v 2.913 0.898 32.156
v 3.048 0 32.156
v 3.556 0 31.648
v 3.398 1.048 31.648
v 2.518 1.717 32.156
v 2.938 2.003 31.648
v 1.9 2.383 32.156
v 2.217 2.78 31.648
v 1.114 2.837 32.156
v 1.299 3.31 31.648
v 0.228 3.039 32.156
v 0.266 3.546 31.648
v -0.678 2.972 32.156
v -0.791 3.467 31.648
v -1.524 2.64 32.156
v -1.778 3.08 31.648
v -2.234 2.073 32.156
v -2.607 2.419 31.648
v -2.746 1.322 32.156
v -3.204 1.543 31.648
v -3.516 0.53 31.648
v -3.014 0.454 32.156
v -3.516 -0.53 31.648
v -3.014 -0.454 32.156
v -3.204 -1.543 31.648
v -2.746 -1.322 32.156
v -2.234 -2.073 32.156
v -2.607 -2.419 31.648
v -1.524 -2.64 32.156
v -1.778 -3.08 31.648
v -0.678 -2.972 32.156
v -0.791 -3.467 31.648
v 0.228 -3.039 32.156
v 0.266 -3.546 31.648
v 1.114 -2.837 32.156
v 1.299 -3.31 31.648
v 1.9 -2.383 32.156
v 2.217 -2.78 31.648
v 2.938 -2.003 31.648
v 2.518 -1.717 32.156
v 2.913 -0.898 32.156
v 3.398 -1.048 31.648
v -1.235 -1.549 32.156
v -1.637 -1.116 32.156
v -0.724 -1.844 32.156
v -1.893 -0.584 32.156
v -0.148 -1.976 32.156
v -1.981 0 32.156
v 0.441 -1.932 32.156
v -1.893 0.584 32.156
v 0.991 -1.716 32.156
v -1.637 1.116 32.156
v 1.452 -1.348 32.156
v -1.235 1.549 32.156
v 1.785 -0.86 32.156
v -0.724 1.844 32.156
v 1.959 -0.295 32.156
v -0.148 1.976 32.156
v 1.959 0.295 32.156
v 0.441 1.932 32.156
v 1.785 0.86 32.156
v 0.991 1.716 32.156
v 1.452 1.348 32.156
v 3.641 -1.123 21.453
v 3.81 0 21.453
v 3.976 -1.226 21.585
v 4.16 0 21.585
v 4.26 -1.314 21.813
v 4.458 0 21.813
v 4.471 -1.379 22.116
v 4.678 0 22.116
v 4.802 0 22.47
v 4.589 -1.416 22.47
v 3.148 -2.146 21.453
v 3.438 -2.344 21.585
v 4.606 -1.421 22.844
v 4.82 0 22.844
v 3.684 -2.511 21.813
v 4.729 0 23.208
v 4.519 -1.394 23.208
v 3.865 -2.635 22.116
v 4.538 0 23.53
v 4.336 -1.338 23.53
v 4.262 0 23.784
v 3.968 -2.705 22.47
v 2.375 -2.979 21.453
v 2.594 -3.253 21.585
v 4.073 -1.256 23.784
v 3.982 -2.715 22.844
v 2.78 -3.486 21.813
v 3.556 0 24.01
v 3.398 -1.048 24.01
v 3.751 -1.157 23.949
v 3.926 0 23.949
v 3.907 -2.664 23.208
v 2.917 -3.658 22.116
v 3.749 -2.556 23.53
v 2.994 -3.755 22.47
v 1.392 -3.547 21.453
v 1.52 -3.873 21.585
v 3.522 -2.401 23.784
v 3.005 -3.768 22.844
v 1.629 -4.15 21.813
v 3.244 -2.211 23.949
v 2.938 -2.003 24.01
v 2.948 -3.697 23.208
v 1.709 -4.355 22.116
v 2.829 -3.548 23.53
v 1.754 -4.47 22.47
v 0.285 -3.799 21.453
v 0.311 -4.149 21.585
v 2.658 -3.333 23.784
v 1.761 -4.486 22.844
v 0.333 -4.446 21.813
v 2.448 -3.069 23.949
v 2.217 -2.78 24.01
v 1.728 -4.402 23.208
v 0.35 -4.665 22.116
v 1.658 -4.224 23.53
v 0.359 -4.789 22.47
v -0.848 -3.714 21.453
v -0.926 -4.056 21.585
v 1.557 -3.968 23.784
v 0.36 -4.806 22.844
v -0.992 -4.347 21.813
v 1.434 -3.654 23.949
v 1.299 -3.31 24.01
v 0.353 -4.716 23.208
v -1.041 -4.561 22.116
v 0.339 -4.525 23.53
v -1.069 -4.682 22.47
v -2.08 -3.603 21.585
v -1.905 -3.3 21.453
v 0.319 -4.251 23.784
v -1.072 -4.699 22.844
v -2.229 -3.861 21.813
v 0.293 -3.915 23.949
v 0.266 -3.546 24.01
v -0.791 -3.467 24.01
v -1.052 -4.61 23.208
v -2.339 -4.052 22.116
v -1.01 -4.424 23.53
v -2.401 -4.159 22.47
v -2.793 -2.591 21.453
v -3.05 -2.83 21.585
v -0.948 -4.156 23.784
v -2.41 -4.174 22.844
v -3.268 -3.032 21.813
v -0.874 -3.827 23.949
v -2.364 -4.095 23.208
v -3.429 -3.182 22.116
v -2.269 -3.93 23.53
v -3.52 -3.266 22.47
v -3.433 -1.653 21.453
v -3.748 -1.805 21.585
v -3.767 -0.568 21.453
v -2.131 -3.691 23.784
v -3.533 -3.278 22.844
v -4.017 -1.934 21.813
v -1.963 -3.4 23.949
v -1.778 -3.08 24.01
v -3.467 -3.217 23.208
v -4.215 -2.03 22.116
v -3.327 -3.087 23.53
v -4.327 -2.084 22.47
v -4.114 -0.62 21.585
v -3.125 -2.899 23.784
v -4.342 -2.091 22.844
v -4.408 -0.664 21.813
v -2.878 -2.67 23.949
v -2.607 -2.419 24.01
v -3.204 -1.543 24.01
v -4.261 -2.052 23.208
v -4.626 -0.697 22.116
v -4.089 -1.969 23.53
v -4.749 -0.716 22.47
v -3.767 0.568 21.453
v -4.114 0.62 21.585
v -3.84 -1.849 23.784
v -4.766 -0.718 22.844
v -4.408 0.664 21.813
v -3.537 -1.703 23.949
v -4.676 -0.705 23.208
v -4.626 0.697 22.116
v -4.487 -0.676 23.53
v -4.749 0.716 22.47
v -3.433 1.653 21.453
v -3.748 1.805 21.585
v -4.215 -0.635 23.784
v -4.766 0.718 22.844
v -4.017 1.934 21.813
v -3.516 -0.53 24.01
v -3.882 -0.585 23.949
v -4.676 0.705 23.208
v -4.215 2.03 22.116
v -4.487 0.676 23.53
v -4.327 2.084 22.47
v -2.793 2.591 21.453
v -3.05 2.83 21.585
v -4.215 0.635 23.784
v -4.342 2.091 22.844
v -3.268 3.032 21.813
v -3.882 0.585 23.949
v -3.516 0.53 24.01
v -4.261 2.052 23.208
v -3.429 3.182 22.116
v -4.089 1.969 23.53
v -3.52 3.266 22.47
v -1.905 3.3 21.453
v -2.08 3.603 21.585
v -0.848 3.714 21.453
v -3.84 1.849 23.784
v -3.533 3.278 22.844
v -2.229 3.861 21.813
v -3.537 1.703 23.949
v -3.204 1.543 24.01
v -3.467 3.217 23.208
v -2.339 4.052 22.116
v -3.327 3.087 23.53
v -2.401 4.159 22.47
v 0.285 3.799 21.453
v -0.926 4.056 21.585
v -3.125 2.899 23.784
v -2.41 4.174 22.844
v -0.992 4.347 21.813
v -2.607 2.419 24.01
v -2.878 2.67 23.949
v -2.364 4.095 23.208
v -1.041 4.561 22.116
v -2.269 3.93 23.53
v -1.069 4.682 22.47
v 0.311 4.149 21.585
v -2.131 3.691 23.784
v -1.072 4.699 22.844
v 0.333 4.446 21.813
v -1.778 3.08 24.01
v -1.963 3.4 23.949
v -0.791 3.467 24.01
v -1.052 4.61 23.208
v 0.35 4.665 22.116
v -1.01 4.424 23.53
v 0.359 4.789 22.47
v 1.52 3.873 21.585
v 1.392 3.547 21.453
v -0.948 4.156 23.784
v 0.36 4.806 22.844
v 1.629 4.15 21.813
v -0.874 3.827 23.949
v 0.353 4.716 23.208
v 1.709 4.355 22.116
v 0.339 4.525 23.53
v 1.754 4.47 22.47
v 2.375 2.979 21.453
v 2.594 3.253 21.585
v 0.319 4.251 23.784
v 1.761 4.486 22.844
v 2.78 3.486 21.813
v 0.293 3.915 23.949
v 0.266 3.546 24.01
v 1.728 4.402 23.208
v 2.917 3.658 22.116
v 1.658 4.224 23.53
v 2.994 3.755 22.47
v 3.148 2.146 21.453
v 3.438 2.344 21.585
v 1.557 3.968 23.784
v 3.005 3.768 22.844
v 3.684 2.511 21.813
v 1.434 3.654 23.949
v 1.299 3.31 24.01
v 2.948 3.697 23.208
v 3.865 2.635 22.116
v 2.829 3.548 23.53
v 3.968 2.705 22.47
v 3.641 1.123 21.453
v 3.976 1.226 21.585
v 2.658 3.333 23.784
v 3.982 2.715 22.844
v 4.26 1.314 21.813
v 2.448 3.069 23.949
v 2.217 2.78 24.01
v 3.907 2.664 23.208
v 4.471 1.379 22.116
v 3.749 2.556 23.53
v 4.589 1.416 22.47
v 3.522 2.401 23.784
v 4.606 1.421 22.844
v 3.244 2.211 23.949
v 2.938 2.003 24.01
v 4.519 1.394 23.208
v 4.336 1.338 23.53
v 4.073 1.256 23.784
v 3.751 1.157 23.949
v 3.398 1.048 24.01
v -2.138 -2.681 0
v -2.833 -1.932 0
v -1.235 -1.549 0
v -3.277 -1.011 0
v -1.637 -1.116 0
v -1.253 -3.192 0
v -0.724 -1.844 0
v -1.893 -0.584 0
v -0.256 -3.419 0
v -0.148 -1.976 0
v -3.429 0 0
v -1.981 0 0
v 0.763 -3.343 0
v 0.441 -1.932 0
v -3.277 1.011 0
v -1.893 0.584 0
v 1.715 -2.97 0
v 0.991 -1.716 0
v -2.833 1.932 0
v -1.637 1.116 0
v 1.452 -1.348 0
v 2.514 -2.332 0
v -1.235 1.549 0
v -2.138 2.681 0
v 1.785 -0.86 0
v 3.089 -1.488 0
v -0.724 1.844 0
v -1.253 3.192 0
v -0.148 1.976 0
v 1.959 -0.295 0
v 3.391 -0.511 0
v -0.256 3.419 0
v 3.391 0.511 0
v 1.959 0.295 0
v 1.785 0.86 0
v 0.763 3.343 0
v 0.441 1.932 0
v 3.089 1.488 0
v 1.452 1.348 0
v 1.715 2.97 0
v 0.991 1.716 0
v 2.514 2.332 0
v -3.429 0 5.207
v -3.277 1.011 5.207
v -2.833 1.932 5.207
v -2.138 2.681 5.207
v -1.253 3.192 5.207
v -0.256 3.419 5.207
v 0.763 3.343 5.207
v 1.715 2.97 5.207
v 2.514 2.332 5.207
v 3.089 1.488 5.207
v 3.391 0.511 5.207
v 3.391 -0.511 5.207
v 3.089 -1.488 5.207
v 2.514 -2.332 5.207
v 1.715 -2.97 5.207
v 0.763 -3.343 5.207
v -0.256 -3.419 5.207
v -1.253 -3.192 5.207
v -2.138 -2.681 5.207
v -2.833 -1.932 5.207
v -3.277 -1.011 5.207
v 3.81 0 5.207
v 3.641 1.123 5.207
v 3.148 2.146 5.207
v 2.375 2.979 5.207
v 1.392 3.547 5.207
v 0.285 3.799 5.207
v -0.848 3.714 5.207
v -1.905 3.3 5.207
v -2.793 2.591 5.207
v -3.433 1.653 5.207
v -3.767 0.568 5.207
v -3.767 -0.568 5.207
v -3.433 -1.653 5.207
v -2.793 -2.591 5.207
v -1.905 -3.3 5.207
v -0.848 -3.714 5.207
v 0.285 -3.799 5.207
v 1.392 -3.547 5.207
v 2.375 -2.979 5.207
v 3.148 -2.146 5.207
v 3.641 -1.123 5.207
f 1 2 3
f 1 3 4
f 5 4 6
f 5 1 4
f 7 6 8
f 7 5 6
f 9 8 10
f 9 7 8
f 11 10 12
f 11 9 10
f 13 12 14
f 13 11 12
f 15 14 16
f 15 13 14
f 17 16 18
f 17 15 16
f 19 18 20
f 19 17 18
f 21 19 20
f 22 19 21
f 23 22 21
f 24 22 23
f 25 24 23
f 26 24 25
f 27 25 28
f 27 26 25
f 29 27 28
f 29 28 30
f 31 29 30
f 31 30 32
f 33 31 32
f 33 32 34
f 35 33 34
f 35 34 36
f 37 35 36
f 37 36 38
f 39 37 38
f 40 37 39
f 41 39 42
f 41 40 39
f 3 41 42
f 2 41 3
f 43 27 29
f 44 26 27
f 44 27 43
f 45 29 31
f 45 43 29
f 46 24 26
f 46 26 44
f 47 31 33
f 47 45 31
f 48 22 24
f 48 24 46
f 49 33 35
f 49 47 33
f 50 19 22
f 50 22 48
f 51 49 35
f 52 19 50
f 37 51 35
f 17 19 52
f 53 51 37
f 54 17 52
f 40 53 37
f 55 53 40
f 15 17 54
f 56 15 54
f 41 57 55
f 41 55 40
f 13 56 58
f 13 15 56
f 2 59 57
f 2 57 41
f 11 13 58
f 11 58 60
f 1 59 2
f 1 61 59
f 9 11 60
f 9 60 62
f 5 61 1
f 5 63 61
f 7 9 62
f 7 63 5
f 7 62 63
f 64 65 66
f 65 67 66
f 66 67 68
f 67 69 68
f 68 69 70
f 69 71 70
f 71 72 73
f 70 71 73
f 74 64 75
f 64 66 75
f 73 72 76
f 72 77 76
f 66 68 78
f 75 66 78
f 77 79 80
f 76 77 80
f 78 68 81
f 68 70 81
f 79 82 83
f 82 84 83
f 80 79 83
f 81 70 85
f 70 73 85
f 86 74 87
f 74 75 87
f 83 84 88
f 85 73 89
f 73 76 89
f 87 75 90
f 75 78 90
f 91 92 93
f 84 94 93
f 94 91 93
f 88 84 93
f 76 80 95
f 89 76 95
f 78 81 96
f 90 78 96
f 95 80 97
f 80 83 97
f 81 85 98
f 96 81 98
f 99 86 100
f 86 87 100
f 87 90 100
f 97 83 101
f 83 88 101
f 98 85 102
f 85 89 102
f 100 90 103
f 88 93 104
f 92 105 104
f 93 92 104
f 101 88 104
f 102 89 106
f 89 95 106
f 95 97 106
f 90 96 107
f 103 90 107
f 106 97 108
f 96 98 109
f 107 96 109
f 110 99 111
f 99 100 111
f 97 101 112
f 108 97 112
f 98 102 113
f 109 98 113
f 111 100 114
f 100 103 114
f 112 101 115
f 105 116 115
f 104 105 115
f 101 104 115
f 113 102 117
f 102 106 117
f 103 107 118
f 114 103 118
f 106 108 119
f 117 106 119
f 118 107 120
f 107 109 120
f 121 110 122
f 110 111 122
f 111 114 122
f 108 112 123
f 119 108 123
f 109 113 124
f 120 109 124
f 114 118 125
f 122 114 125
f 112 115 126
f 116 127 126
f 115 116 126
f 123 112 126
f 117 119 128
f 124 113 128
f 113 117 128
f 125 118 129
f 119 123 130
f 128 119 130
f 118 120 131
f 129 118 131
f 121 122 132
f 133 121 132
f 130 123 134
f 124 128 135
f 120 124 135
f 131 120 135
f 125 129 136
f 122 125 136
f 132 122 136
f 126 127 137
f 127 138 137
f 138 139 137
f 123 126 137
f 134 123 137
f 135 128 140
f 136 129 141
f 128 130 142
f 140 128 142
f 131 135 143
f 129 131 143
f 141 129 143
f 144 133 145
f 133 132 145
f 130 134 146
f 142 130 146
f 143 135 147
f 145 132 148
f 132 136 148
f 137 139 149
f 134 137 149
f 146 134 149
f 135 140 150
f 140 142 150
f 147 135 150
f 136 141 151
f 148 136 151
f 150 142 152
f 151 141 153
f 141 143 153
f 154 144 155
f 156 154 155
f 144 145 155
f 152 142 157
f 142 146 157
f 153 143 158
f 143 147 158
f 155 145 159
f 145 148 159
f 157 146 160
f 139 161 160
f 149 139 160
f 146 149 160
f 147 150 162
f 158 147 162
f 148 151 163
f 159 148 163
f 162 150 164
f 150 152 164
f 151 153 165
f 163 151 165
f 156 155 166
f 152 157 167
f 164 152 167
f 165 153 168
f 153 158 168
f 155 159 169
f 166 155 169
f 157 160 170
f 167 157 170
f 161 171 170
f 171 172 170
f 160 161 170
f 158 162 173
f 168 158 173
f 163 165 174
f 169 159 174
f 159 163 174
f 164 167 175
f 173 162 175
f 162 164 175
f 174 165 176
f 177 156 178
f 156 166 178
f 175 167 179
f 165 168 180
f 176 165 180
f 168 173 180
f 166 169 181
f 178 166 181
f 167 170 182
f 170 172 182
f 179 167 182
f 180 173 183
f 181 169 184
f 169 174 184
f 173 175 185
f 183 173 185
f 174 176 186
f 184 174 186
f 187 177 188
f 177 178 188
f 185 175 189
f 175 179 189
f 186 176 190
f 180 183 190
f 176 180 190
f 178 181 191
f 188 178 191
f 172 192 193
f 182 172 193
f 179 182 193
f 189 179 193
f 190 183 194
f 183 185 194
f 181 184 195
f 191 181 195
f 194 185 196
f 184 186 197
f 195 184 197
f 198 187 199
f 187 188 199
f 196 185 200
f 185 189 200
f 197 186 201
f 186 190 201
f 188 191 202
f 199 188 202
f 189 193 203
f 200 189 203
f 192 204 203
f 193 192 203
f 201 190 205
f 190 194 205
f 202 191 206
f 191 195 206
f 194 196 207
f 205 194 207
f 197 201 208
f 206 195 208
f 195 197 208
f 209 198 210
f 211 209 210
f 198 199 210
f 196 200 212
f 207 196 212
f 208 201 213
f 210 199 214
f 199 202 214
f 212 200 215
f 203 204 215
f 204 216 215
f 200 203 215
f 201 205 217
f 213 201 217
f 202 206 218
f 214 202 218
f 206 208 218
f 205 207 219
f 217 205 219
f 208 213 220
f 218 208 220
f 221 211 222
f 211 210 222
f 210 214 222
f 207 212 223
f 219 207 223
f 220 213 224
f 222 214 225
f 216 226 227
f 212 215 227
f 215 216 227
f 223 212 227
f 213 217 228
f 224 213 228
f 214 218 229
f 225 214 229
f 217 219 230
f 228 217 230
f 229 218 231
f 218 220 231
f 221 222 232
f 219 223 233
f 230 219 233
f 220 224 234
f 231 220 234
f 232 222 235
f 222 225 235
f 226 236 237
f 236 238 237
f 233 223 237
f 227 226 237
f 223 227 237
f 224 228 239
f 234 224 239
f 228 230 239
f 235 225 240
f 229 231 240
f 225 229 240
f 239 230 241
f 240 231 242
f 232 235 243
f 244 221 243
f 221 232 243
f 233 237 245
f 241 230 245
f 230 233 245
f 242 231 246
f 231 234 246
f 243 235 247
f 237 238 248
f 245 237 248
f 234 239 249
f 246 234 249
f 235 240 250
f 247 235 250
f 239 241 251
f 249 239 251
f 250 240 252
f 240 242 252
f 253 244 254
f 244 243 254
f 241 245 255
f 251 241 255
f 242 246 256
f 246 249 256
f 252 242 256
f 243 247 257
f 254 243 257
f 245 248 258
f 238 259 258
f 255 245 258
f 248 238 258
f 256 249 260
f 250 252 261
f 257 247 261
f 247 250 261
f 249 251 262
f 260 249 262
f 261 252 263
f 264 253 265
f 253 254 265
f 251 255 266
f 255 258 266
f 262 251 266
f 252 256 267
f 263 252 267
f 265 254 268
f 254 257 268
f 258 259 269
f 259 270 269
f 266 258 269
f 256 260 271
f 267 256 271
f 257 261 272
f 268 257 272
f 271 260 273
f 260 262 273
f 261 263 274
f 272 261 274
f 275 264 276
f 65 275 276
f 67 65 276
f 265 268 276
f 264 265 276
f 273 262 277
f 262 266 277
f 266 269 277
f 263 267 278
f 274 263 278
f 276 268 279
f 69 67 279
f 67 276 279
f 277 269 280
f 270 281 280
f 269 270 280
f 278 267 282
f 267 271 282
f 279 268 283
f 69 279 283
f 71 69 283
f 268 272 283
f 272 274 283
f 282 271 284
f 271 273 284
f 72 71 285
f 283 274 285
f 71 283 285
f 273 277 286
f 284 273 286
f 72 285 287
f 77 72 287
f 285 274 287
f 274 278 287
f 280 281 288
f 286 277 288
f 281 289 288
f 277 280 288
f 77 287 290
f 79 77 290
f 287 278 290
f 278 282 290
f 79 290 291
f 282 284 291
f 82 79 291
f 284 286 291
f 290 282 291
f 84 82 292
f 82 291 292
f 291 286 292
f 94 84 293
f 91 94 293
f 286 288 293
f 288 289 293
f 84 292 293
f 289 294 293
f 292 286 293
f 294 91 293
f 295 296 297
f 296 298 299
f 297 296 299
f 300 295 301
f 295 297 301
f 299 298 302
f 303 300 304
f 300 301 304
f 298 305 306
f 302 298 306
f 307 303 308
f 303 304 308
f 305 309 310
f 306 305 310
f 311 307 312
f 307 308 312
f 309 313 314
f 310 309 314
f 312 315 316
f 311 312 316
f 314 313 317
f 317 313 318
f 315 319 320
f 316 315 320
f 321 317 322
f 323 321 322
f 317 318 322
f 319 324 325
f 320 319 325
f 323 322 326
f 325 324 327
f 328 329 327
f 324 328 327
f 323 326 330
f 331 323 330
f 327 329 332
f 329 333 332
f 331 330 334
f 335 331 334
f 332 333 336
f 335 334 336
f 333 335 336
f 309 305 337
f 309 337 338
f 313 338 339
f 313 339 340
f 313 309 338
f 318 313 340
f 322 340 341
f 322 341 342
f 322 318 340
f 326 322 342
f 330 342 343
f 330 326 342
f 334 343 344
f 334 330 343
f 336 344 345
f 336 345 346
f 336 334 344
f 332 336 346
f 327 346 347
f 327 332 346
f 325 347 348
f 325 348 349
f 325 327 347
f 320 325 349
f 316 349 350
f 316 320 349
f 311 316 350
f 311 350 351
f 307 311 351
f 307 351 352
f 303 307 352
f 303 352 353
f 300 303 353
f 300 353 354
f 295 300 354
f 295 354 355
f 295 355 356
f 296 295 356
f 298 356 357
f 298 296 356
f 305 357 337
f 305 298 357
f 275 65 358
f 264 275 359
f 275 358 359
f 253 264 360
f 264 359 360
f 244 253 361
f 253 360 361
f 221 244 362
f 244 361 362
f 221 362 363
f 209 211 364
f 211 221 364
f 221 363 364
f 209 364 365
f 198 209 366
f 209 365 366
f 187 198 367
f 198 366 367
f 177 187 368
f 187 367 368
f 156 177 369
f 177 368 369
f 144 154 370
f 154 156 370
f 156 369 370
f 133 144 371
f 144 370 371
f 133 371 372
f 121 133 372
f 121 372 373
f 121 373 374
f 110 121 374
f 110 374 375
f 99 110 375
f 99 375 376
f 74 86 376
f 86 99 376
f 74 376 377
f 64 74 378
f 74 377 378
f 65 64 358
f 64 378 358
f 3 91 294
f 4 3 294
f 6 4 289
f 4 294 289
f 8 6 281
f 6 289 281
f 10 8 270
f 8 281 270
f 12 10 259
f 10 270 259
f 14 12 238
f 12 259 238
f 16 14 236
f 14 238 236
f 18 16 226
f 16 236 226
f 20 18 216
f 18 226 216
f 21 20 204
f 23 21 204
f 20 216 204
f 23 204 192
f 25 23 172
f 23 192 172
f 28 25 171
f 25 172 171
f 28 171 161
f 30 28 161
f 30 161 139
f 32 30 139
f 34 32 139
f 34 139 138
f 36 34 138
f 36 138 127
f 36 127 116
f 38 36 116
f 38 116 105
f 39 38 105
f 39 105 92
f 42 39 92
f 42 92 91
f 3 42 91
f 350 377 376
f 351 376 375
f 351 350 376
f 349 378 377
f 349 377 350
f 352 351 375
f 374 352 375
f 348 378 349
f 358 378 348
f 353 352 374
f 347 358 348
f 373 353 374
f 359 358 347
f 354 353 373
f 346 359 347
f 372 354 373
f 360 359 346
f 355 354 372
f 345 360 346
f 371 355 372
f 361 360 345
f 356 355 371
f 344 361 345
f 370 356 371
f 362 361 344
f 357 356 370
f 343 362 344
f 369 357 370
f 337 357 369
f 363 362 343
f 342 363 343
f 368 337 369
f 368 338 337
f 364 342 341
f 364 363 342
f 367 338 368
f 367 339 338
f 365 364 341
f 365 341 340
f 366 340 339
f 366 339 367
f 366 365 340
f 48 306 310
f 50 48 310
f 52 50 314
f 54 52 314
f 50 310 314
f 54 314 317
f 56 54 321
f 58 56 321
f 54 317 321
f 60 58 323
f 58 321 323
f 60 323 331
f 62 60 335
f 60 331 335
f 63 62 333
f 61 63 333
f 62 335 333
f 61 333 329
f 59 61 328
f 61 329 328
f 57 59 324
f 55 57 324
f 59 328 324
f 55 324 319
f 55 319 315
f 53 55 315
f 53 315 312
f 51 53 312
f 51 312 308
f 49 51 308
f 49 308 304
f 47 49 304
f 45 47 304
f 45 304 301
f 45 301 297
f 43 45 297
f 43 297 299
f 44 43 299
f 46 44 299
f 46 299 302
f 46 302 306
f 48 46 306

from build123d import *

# Parameters (mm, degrees)
SKETCH1_R           = 3.81
BOSS_EXTRUDE1_DEPTH = 32.1564
SKETCH2_R           = 1.9812
CUT_EXTRUDE1_DEPTH  = 33.604696916
SKETCH3_R           = 3.81
SKETCH3_R_2         = 3.429
CUT_EXTRUDE2_DEPTH  = 5.207
CUT_EXTRUDE3_START  = -9.652
SKETCH4_R           = 3.81
SKETCH4_R_2         = 3.556
CUT_EXTRUDE3_DEPTH  = 9.652
CHAMFER1_SIZE       = 0.508


with BuildPart() as part:
    # Sketch1 → Boss-Extrude1 (new body)
    with BuildSketch(Plane.XY):
        Circle(SKETCH1_R)
    extrude(amount=BOSS_EXTRUDE1_DEPTH)

    # Sketch2 → Cut-Extrude1 (cut, through all)
    with BuildSketch(Plane(origin=(0, 0, 0), x_dir=(-1, 0, 0), z_dir=(0, 0, -1))):
        Circle(SKETCH2_R)
    extrude(amount=-CUT_EXTRUDE1_DEPTH, mode=Mode.SUBTRACT)

    # Sketch3 → Cut-Extrude2 (cut)
    with BuildSketch(Plane(origin=(0, 0, 0), x_dir=(-1, 0, 0), z_dir=(0, 0, -1))):
        Circle(SKETCH3_R)
        Circle(SKETCH3_R_2, mode=Mode.SUBTRACT)
    extrude(amount=-CUT_EXTRUDE2_DEPTH, mode=Mode.SUBTRACT)

    # Sketch4 → Cut-Extrude3 (cut)
    with BuildSketch(Plane.XY.offset(32.1564).offset(CUT_EXTRUDE3_START)):
        with Locations(Location((0, 0, 0), (0, 0, 180))):
            Circle(SKETCH4_R)
        Circle(SKETCH4_R_2, mode=Mode.SUBTRACT)
    extrude(amount=CUT_EXTRUDE3_DEPTH, mode=Mode.SUBTRACT)

    # Sketch5 → Revolve1 (revolve)
    with BuildSketch(Plane(origin=(0, 0, 0), x_dir=(1, 0, 0), z_dir=(0, 1, 0))):
        with BuildLine():
            Line((3.556, -24.009676403), (3.269595119, -21.452809))
            Line((3.269595119, -21.452809), (3.81, -21.452809))
            ThreePointArc((3.81, -21.452809), (4.81966386, -22.844159242), (3.556, -24.009676403))
        make_face()
    revolve(axis=Axis((0, 0, 32.1564), (0, 0, -1)))

    # Chamfer1
    chamfer1_edges = [part.edges().sort_by_distance(p)[0] for p in [
        (-3.556, 0, 32.1564),
    ]]
    chamfer(chamfer1_edges, length=CHAMFER1_SIZE)


solid = part.part
